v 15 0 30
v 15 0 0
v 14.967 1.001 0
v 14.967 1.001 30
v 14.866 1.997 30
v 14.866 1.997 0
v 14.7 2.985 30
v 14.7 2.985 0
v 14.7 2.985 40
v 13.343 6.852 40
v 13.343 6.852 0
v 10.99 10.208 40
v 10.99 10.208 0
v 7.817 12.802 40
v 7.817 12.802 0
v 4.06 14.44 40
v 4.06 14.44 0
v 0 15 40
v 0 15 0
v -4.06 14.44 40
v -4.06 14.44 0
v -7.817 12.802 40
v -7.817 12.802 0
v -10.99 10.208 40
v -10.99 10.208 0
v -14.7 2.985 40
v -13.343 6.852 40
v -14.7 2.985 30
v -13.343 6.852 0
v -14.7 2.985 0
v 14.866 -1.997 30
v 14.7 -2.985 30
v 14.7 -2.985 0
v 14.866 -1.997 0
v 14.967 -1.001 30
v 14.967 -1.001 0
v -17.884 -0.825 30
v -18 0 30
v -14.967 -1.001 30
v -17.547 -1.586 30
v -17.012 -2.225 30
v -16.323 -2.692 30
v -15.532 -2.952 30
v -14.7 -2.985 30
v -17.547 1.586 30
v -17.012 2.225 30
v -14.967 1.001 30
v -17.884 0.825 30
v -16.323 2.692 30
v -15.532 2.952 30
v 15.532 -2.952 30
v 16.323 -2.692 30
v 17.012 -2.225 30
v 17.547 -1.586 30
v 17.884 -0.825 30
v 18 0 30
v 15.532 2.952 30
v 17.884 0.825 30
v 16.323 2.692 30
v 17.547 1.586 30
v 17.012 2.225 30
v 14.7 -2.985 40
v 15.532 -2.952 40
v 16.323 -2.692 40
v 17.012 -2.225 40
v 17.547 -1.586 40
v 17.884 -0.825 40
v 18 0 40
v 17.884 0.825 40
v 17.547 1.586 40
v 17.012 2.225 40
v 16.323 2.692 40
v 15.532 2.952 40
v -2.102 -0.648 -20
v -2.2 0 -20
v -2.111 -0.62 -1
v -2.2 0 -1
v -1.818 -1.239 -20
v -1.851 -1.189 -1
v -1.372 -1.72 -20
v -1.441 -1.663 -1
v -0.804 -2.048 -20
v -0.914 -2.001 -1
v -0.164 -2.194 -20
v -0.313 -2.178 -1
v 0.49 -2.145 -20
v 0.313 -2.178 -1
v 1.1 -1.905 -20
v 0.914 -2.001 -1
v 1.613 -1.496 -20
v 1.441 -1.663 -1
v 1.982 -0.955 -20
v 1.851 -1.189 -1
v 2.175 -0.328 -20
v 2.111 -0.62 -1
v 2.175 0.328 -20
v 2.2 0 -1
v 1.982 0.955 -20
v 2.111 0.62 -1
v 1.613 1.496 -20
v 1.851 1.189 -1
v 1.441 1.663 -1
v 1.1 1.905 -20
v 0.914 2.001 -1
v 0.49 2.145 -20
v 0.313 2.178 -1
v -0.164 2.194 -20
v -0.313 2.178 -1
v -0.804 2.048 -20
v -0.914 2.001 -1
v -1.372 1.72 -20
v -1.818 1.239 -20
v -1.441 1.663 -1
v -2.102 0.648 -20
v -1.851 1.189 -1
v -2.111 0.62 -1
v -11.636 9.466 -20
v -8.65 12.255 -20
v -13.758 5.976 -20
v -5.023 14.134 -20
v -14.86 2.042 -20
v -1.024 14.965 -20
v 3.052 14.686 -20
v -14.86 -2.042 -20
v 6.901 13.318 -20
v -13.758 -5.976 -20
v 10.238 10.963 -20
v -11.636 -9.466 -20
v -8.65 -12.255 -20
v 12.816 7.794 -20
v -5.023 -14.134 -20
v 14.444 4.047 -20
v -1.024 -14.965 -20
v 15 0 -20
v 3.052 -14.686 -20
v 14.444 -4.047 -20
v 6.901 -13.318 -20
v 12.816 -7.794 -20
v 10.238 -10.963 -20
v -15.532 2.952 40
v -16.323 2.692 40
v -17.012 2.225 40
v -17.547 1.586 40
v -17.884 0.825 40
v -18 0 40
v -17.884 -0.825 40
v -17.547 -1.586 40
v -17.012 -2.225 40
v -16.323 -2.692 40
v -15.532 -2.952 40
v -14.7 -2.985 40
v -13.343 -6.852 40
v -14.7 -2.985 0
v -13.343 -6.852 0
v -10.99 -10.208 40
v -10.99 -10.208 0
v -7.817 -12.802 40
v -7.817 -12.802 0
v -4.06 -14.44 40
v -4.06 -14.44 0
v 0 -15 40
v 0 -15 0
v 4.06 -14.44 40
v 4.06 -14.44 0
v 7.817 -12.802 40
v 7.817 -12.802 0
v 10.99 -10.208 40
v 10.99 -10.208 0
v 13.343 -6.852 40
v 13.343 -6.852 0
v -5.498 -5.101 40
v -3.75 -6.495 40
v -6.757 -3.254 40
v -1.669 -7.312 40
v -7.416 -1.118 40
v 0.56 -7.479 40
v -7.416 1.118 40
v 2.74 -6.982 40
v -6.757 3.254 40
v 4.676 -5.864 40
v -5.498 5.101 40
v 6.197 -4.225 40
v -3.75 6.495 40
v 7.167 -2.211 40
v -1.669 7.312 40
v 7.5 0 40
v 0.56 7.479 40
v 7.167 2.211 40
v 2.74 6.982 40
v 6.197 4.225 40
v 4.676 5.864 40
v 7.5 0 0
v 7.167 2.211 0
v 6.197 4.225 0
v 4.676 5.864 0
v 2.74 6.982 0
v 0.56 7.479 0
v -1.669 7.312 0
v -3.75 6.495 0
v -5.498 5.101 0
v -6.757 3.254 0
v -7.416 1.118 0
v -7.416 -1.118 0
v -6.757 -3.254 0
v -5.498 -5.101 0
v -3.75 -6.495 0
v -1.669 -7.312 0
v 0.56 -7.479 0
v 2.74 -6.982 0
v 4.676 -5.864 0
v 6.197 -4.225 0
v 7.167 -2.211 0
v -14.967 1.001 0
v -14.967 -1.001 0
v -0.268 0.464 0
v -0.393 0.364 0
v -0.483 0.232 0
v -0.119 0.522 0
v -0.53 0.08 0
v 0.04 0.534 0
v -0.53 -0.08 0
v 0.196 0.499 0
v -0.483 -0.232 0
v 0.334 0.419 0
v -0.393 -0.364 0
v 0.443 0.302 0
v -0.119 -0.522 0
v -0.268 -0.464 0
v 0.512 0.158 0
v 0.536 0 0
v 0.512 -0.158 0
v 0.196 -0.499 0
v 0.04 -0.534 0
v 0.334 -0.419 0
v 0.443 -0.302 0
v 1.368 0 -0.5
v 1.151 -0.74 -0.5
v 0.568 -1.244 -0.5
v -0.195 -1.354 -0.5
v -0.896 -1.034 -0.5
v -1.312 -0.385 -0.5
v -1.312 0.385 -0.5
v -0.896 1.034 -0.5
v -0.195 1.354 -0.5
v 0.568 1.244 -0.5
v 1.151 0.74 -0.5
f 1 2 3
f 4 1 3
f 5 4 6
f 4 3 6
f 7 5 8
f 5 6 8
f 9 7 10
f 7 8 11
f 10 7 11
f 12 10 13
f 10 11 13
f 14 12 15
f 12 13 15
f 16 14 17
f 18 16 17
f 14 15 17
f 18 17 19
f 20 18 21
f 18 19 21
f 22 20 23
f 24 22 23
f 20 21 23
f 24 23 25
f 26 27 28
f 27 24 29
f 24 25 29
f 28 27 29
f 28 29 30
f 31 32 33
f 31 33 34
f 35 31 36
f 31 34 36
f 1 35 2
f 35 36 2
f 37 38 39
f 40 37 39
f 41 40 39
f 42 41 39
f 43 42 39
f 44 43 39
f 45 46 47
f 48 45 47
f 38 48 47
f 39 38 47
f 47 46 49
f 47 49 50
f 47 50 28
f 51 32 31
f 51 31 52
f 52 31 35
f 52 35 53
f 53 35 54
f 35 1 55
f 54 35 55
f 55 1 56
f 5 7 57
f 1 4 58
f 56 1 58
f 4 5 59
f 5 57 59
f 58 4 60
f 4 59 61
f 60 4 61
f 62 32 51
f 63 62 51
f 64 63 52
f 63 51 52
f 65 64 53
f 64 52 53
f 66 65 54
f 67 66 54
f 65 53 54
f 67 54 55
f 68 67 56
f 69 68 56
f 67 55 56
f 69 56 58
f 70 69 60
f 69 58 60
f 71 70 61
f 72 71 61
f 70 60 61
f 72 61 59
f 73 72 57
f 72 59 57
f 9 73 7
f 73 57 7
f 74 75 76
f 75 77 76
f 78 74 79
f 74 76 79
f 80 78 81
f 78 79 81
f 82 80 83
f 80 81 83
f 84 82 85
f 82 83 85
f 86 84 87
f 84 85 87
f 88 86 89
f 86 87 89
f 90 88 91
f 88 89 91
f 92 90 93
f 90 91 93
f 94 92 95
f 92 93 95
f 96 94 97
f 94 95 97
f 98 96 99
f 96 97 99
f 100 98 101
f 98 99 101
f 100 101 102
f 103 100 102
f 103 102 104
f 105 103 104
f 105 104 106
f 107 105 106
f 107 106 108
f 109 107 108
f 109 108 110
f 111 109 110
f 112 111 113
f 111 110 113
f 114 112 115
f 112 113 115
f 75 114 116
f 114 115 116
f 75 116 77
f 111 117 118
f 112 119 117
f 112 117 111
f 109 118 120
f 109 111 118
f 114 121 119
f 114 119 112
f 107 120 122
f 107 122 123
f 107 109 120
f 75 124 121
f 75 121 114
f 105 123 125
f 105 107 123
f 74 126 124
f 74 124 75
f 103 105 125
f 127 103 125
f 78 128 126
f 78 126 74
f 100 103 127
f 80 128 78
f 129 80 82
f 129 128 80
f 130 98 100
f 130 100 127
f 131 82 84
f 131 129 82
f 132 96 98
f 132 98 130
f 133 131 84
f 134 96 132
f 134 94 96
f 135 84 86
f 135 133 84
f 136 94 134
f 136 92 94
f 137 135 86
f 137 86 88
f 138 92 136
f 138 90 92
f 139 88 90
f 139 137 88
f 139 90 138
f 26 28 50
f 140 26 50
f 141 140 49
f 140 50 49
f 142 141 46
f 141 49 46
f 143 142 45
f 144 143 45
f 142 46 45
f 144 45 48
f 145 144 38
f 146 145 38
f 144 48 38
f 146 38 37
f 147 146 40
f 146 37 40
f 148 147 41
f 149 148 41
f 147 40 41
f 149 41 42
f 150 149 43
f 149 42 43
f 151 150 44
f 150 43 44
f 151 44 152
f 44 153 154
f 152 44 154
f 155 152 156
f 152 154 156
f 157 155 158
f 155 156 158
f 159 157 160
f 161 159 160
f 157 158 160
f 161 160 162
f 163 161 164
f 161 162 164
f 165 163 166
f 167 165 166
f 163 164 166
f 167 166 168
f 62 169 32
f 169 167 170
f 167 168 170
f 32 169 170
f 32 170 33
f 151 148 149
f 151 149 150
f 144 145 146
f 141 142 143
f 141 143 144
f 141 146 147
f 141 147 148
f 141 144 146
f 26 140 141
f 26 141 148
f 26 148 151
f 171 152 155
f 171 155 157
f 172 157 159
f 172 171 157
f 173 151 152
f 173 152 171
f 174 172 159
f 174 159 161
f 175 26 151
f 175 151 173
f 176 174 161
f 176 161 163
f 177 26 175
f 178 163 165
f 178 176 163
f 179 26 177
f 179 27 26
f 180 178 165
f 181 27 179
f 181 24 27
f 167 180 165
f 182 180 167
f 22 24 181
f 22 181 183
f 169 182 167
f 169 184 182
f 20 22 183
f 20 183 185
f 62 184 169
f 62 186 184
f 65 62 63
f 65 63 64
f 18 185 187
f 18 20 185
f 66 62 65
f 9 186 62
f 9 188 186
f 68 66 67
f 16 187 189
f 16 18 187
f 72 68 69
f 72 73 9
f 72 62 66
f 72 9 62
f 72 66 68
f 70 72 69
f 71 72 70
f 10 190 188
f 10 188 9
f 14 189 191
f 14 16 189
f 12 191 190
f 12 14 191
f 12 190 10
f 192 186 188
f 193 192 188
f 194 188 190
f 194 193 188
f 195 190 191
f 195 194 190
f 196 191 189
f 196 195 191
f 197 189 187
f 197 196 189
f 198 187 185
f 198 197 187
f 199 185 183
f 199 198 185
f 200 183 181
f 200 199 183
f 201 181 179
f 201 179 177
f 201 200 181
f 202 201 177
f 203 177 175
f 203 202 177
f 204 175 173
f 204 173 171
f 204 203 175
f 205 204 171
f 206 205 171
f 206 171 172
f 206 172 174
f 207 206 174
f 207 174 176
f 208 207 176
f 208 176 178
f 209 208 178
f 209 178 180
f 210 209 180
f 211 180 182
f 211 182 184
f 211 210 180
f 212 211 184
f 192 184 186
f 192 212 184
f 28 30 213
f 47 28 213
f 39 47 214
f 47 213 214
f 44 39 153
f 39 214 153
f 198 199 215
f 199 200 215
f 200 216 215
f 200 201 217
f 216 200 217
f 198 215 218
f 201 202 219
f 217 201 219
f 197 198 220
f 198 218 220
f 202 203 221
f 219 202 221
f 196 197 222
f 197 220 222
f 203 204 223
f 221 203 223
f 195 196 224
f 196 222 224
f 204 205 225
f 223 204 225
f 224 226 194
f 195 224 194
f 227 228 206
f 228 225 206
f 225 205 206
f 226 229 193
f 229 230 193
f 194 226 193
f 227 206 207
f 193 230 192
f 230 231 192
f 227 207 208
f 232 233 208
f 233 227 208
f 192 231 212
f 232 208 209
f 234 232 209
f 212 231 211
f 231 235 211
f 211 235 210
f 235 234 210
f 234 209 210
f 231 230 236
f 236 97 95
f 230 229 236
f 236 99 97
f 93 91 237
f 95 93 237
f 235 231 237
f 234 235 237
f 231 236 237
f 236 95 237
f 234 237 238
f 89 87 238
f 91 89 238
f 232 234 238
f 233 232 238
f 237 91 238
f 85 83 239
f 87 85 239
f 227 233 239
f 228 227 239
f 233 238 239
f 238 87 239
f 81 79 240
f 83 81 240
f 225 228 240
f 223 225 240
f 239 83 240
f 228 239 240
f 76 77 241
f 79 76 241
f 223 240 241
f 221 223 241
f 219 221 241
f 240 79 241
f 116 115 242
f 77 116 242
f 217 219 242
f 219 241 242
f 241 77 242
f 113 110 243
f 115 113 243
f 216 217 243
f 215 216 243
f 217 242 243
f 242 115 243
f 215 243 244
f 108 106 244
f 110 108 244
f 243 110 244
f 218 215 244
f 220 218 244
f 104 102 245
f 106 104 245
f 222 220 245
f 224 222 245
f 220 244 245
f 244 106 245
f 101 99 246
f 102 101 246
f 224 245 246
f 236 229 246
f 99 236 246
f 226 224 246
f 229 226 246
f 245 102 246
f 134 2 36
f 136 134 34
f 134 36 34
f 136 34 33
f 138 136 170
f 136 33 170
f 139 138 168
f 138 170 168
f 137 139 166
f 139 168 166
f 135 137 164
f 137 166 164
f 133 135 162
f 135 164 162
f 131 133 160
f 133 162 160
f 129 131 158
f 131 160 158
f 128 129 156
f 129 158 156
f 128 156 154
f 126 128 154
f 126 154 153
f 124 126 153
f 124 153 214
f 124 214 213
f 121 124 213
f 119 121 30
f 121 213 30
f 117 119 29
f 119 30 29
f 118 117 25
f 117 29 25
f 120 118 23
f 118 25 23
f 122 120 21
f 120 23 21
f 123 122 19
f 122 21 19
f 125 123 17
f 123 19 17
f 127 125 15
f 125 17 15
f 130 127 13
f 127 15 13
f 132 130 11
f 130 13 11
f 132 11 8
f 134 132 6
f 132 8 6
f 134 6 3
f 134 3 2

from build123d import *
from build123d import SkipClean  # not in build123d's __all__

# Parameters (mm, degrees)
F0_R     = 7.5
F1_DEPTH = 40
F2_START = 30
F2_DEPTH = 10
F3_R     = 15
F4_DEPTH = 20
F6_D     = 4.4
F6_DEPTH = 19
F6_TIP   = 1.3218933619


# Not quite as in the source:
# - after a boolean that leaves OpenCascade's solid faulty, fix() repairs it


with BuildPart() as f1:
    # F0 (on Top) → F1 (new body)
    with BuildSketch(Plane.XY):
        with BuildLine():
            ThreePointArc((14.7, -2.9849623113), (14.9248115566, -1.5), (15, 0))
            ThreePointArc((15, 0), (14.9248115566, 1.5), (14.7, 2.9849623113))
            ThreePointArc((14.7, 2.9849623113), (0, 15), (-14.7, 2.9849623113))
            ThreePointArc((-14.7, 2.9849623113), (-15, 0), (-14.7, -2.9849623113))
            ThreePointArc((-14.7, -2.9849623113), (0, -15), (14.7, -2.9849623113))
        make_face()
        Circle(F0_R, mode=Mode.SUBTRACT)
    extrude(amount=F1_DEPTH)

    # F0 (on Top) → F2 (join)
    with BuildSketch(Plane.XY.offset(F2_START)):
        with BuildLine():
            ThreePointArc((-14.7, -2.9849623113), (-15, 0), (-14.7, 2.9849623113))
            ThreePointArc((-14.7, 2.9849623113), (-18, 0), (-14.7, -2.9849623113))
        make_face()
        with BuildLine():
            ThreePointArc((14.7, 2.9849623113), (14.9248115566, 1.5), (15, 0))
            ThreePointArc((15, 0), (14.9248115566, -1.5), (14.7, -2.9849623113))
            ThreePointArc((14.7, -2.9849623113), (18, 0), (14.7, 2.9849623113))
        make_face()
    extrude(amount=F2_DEPTH)

    # F3 (on face) → F4 (join)
    with BuildSketch(Plane(origin=(0, 0, 0), x_dir=(1, 0, 0), z_dir=(0, 0, -1))):
        Circle(F3_R)
    with SkipClean():  # cleaning this boolean's faces spoils the solid; the shape is the same uncleaned
        extrude(amount=F4_DEPTH)

    # F6
    with Locations(Plane(origin=(0, 0, -20), x_dir=(1, 0, 0), z_dir=(0, 0, -1))):
        with Locations((0, 0)):
            Hole(F6_D / 2, depth=F6_DEPTH)
            with Locations((0, 0, -(F6_DEPTH + F6_TIP / 2))):  # 118° drill point
                Cone(0, F6_D / 2, F6_TIP, mode=Mode.SUBTRACT)

    add(f1.part.fix(), mode=Mode.REPLACE)


solid = f1.part
